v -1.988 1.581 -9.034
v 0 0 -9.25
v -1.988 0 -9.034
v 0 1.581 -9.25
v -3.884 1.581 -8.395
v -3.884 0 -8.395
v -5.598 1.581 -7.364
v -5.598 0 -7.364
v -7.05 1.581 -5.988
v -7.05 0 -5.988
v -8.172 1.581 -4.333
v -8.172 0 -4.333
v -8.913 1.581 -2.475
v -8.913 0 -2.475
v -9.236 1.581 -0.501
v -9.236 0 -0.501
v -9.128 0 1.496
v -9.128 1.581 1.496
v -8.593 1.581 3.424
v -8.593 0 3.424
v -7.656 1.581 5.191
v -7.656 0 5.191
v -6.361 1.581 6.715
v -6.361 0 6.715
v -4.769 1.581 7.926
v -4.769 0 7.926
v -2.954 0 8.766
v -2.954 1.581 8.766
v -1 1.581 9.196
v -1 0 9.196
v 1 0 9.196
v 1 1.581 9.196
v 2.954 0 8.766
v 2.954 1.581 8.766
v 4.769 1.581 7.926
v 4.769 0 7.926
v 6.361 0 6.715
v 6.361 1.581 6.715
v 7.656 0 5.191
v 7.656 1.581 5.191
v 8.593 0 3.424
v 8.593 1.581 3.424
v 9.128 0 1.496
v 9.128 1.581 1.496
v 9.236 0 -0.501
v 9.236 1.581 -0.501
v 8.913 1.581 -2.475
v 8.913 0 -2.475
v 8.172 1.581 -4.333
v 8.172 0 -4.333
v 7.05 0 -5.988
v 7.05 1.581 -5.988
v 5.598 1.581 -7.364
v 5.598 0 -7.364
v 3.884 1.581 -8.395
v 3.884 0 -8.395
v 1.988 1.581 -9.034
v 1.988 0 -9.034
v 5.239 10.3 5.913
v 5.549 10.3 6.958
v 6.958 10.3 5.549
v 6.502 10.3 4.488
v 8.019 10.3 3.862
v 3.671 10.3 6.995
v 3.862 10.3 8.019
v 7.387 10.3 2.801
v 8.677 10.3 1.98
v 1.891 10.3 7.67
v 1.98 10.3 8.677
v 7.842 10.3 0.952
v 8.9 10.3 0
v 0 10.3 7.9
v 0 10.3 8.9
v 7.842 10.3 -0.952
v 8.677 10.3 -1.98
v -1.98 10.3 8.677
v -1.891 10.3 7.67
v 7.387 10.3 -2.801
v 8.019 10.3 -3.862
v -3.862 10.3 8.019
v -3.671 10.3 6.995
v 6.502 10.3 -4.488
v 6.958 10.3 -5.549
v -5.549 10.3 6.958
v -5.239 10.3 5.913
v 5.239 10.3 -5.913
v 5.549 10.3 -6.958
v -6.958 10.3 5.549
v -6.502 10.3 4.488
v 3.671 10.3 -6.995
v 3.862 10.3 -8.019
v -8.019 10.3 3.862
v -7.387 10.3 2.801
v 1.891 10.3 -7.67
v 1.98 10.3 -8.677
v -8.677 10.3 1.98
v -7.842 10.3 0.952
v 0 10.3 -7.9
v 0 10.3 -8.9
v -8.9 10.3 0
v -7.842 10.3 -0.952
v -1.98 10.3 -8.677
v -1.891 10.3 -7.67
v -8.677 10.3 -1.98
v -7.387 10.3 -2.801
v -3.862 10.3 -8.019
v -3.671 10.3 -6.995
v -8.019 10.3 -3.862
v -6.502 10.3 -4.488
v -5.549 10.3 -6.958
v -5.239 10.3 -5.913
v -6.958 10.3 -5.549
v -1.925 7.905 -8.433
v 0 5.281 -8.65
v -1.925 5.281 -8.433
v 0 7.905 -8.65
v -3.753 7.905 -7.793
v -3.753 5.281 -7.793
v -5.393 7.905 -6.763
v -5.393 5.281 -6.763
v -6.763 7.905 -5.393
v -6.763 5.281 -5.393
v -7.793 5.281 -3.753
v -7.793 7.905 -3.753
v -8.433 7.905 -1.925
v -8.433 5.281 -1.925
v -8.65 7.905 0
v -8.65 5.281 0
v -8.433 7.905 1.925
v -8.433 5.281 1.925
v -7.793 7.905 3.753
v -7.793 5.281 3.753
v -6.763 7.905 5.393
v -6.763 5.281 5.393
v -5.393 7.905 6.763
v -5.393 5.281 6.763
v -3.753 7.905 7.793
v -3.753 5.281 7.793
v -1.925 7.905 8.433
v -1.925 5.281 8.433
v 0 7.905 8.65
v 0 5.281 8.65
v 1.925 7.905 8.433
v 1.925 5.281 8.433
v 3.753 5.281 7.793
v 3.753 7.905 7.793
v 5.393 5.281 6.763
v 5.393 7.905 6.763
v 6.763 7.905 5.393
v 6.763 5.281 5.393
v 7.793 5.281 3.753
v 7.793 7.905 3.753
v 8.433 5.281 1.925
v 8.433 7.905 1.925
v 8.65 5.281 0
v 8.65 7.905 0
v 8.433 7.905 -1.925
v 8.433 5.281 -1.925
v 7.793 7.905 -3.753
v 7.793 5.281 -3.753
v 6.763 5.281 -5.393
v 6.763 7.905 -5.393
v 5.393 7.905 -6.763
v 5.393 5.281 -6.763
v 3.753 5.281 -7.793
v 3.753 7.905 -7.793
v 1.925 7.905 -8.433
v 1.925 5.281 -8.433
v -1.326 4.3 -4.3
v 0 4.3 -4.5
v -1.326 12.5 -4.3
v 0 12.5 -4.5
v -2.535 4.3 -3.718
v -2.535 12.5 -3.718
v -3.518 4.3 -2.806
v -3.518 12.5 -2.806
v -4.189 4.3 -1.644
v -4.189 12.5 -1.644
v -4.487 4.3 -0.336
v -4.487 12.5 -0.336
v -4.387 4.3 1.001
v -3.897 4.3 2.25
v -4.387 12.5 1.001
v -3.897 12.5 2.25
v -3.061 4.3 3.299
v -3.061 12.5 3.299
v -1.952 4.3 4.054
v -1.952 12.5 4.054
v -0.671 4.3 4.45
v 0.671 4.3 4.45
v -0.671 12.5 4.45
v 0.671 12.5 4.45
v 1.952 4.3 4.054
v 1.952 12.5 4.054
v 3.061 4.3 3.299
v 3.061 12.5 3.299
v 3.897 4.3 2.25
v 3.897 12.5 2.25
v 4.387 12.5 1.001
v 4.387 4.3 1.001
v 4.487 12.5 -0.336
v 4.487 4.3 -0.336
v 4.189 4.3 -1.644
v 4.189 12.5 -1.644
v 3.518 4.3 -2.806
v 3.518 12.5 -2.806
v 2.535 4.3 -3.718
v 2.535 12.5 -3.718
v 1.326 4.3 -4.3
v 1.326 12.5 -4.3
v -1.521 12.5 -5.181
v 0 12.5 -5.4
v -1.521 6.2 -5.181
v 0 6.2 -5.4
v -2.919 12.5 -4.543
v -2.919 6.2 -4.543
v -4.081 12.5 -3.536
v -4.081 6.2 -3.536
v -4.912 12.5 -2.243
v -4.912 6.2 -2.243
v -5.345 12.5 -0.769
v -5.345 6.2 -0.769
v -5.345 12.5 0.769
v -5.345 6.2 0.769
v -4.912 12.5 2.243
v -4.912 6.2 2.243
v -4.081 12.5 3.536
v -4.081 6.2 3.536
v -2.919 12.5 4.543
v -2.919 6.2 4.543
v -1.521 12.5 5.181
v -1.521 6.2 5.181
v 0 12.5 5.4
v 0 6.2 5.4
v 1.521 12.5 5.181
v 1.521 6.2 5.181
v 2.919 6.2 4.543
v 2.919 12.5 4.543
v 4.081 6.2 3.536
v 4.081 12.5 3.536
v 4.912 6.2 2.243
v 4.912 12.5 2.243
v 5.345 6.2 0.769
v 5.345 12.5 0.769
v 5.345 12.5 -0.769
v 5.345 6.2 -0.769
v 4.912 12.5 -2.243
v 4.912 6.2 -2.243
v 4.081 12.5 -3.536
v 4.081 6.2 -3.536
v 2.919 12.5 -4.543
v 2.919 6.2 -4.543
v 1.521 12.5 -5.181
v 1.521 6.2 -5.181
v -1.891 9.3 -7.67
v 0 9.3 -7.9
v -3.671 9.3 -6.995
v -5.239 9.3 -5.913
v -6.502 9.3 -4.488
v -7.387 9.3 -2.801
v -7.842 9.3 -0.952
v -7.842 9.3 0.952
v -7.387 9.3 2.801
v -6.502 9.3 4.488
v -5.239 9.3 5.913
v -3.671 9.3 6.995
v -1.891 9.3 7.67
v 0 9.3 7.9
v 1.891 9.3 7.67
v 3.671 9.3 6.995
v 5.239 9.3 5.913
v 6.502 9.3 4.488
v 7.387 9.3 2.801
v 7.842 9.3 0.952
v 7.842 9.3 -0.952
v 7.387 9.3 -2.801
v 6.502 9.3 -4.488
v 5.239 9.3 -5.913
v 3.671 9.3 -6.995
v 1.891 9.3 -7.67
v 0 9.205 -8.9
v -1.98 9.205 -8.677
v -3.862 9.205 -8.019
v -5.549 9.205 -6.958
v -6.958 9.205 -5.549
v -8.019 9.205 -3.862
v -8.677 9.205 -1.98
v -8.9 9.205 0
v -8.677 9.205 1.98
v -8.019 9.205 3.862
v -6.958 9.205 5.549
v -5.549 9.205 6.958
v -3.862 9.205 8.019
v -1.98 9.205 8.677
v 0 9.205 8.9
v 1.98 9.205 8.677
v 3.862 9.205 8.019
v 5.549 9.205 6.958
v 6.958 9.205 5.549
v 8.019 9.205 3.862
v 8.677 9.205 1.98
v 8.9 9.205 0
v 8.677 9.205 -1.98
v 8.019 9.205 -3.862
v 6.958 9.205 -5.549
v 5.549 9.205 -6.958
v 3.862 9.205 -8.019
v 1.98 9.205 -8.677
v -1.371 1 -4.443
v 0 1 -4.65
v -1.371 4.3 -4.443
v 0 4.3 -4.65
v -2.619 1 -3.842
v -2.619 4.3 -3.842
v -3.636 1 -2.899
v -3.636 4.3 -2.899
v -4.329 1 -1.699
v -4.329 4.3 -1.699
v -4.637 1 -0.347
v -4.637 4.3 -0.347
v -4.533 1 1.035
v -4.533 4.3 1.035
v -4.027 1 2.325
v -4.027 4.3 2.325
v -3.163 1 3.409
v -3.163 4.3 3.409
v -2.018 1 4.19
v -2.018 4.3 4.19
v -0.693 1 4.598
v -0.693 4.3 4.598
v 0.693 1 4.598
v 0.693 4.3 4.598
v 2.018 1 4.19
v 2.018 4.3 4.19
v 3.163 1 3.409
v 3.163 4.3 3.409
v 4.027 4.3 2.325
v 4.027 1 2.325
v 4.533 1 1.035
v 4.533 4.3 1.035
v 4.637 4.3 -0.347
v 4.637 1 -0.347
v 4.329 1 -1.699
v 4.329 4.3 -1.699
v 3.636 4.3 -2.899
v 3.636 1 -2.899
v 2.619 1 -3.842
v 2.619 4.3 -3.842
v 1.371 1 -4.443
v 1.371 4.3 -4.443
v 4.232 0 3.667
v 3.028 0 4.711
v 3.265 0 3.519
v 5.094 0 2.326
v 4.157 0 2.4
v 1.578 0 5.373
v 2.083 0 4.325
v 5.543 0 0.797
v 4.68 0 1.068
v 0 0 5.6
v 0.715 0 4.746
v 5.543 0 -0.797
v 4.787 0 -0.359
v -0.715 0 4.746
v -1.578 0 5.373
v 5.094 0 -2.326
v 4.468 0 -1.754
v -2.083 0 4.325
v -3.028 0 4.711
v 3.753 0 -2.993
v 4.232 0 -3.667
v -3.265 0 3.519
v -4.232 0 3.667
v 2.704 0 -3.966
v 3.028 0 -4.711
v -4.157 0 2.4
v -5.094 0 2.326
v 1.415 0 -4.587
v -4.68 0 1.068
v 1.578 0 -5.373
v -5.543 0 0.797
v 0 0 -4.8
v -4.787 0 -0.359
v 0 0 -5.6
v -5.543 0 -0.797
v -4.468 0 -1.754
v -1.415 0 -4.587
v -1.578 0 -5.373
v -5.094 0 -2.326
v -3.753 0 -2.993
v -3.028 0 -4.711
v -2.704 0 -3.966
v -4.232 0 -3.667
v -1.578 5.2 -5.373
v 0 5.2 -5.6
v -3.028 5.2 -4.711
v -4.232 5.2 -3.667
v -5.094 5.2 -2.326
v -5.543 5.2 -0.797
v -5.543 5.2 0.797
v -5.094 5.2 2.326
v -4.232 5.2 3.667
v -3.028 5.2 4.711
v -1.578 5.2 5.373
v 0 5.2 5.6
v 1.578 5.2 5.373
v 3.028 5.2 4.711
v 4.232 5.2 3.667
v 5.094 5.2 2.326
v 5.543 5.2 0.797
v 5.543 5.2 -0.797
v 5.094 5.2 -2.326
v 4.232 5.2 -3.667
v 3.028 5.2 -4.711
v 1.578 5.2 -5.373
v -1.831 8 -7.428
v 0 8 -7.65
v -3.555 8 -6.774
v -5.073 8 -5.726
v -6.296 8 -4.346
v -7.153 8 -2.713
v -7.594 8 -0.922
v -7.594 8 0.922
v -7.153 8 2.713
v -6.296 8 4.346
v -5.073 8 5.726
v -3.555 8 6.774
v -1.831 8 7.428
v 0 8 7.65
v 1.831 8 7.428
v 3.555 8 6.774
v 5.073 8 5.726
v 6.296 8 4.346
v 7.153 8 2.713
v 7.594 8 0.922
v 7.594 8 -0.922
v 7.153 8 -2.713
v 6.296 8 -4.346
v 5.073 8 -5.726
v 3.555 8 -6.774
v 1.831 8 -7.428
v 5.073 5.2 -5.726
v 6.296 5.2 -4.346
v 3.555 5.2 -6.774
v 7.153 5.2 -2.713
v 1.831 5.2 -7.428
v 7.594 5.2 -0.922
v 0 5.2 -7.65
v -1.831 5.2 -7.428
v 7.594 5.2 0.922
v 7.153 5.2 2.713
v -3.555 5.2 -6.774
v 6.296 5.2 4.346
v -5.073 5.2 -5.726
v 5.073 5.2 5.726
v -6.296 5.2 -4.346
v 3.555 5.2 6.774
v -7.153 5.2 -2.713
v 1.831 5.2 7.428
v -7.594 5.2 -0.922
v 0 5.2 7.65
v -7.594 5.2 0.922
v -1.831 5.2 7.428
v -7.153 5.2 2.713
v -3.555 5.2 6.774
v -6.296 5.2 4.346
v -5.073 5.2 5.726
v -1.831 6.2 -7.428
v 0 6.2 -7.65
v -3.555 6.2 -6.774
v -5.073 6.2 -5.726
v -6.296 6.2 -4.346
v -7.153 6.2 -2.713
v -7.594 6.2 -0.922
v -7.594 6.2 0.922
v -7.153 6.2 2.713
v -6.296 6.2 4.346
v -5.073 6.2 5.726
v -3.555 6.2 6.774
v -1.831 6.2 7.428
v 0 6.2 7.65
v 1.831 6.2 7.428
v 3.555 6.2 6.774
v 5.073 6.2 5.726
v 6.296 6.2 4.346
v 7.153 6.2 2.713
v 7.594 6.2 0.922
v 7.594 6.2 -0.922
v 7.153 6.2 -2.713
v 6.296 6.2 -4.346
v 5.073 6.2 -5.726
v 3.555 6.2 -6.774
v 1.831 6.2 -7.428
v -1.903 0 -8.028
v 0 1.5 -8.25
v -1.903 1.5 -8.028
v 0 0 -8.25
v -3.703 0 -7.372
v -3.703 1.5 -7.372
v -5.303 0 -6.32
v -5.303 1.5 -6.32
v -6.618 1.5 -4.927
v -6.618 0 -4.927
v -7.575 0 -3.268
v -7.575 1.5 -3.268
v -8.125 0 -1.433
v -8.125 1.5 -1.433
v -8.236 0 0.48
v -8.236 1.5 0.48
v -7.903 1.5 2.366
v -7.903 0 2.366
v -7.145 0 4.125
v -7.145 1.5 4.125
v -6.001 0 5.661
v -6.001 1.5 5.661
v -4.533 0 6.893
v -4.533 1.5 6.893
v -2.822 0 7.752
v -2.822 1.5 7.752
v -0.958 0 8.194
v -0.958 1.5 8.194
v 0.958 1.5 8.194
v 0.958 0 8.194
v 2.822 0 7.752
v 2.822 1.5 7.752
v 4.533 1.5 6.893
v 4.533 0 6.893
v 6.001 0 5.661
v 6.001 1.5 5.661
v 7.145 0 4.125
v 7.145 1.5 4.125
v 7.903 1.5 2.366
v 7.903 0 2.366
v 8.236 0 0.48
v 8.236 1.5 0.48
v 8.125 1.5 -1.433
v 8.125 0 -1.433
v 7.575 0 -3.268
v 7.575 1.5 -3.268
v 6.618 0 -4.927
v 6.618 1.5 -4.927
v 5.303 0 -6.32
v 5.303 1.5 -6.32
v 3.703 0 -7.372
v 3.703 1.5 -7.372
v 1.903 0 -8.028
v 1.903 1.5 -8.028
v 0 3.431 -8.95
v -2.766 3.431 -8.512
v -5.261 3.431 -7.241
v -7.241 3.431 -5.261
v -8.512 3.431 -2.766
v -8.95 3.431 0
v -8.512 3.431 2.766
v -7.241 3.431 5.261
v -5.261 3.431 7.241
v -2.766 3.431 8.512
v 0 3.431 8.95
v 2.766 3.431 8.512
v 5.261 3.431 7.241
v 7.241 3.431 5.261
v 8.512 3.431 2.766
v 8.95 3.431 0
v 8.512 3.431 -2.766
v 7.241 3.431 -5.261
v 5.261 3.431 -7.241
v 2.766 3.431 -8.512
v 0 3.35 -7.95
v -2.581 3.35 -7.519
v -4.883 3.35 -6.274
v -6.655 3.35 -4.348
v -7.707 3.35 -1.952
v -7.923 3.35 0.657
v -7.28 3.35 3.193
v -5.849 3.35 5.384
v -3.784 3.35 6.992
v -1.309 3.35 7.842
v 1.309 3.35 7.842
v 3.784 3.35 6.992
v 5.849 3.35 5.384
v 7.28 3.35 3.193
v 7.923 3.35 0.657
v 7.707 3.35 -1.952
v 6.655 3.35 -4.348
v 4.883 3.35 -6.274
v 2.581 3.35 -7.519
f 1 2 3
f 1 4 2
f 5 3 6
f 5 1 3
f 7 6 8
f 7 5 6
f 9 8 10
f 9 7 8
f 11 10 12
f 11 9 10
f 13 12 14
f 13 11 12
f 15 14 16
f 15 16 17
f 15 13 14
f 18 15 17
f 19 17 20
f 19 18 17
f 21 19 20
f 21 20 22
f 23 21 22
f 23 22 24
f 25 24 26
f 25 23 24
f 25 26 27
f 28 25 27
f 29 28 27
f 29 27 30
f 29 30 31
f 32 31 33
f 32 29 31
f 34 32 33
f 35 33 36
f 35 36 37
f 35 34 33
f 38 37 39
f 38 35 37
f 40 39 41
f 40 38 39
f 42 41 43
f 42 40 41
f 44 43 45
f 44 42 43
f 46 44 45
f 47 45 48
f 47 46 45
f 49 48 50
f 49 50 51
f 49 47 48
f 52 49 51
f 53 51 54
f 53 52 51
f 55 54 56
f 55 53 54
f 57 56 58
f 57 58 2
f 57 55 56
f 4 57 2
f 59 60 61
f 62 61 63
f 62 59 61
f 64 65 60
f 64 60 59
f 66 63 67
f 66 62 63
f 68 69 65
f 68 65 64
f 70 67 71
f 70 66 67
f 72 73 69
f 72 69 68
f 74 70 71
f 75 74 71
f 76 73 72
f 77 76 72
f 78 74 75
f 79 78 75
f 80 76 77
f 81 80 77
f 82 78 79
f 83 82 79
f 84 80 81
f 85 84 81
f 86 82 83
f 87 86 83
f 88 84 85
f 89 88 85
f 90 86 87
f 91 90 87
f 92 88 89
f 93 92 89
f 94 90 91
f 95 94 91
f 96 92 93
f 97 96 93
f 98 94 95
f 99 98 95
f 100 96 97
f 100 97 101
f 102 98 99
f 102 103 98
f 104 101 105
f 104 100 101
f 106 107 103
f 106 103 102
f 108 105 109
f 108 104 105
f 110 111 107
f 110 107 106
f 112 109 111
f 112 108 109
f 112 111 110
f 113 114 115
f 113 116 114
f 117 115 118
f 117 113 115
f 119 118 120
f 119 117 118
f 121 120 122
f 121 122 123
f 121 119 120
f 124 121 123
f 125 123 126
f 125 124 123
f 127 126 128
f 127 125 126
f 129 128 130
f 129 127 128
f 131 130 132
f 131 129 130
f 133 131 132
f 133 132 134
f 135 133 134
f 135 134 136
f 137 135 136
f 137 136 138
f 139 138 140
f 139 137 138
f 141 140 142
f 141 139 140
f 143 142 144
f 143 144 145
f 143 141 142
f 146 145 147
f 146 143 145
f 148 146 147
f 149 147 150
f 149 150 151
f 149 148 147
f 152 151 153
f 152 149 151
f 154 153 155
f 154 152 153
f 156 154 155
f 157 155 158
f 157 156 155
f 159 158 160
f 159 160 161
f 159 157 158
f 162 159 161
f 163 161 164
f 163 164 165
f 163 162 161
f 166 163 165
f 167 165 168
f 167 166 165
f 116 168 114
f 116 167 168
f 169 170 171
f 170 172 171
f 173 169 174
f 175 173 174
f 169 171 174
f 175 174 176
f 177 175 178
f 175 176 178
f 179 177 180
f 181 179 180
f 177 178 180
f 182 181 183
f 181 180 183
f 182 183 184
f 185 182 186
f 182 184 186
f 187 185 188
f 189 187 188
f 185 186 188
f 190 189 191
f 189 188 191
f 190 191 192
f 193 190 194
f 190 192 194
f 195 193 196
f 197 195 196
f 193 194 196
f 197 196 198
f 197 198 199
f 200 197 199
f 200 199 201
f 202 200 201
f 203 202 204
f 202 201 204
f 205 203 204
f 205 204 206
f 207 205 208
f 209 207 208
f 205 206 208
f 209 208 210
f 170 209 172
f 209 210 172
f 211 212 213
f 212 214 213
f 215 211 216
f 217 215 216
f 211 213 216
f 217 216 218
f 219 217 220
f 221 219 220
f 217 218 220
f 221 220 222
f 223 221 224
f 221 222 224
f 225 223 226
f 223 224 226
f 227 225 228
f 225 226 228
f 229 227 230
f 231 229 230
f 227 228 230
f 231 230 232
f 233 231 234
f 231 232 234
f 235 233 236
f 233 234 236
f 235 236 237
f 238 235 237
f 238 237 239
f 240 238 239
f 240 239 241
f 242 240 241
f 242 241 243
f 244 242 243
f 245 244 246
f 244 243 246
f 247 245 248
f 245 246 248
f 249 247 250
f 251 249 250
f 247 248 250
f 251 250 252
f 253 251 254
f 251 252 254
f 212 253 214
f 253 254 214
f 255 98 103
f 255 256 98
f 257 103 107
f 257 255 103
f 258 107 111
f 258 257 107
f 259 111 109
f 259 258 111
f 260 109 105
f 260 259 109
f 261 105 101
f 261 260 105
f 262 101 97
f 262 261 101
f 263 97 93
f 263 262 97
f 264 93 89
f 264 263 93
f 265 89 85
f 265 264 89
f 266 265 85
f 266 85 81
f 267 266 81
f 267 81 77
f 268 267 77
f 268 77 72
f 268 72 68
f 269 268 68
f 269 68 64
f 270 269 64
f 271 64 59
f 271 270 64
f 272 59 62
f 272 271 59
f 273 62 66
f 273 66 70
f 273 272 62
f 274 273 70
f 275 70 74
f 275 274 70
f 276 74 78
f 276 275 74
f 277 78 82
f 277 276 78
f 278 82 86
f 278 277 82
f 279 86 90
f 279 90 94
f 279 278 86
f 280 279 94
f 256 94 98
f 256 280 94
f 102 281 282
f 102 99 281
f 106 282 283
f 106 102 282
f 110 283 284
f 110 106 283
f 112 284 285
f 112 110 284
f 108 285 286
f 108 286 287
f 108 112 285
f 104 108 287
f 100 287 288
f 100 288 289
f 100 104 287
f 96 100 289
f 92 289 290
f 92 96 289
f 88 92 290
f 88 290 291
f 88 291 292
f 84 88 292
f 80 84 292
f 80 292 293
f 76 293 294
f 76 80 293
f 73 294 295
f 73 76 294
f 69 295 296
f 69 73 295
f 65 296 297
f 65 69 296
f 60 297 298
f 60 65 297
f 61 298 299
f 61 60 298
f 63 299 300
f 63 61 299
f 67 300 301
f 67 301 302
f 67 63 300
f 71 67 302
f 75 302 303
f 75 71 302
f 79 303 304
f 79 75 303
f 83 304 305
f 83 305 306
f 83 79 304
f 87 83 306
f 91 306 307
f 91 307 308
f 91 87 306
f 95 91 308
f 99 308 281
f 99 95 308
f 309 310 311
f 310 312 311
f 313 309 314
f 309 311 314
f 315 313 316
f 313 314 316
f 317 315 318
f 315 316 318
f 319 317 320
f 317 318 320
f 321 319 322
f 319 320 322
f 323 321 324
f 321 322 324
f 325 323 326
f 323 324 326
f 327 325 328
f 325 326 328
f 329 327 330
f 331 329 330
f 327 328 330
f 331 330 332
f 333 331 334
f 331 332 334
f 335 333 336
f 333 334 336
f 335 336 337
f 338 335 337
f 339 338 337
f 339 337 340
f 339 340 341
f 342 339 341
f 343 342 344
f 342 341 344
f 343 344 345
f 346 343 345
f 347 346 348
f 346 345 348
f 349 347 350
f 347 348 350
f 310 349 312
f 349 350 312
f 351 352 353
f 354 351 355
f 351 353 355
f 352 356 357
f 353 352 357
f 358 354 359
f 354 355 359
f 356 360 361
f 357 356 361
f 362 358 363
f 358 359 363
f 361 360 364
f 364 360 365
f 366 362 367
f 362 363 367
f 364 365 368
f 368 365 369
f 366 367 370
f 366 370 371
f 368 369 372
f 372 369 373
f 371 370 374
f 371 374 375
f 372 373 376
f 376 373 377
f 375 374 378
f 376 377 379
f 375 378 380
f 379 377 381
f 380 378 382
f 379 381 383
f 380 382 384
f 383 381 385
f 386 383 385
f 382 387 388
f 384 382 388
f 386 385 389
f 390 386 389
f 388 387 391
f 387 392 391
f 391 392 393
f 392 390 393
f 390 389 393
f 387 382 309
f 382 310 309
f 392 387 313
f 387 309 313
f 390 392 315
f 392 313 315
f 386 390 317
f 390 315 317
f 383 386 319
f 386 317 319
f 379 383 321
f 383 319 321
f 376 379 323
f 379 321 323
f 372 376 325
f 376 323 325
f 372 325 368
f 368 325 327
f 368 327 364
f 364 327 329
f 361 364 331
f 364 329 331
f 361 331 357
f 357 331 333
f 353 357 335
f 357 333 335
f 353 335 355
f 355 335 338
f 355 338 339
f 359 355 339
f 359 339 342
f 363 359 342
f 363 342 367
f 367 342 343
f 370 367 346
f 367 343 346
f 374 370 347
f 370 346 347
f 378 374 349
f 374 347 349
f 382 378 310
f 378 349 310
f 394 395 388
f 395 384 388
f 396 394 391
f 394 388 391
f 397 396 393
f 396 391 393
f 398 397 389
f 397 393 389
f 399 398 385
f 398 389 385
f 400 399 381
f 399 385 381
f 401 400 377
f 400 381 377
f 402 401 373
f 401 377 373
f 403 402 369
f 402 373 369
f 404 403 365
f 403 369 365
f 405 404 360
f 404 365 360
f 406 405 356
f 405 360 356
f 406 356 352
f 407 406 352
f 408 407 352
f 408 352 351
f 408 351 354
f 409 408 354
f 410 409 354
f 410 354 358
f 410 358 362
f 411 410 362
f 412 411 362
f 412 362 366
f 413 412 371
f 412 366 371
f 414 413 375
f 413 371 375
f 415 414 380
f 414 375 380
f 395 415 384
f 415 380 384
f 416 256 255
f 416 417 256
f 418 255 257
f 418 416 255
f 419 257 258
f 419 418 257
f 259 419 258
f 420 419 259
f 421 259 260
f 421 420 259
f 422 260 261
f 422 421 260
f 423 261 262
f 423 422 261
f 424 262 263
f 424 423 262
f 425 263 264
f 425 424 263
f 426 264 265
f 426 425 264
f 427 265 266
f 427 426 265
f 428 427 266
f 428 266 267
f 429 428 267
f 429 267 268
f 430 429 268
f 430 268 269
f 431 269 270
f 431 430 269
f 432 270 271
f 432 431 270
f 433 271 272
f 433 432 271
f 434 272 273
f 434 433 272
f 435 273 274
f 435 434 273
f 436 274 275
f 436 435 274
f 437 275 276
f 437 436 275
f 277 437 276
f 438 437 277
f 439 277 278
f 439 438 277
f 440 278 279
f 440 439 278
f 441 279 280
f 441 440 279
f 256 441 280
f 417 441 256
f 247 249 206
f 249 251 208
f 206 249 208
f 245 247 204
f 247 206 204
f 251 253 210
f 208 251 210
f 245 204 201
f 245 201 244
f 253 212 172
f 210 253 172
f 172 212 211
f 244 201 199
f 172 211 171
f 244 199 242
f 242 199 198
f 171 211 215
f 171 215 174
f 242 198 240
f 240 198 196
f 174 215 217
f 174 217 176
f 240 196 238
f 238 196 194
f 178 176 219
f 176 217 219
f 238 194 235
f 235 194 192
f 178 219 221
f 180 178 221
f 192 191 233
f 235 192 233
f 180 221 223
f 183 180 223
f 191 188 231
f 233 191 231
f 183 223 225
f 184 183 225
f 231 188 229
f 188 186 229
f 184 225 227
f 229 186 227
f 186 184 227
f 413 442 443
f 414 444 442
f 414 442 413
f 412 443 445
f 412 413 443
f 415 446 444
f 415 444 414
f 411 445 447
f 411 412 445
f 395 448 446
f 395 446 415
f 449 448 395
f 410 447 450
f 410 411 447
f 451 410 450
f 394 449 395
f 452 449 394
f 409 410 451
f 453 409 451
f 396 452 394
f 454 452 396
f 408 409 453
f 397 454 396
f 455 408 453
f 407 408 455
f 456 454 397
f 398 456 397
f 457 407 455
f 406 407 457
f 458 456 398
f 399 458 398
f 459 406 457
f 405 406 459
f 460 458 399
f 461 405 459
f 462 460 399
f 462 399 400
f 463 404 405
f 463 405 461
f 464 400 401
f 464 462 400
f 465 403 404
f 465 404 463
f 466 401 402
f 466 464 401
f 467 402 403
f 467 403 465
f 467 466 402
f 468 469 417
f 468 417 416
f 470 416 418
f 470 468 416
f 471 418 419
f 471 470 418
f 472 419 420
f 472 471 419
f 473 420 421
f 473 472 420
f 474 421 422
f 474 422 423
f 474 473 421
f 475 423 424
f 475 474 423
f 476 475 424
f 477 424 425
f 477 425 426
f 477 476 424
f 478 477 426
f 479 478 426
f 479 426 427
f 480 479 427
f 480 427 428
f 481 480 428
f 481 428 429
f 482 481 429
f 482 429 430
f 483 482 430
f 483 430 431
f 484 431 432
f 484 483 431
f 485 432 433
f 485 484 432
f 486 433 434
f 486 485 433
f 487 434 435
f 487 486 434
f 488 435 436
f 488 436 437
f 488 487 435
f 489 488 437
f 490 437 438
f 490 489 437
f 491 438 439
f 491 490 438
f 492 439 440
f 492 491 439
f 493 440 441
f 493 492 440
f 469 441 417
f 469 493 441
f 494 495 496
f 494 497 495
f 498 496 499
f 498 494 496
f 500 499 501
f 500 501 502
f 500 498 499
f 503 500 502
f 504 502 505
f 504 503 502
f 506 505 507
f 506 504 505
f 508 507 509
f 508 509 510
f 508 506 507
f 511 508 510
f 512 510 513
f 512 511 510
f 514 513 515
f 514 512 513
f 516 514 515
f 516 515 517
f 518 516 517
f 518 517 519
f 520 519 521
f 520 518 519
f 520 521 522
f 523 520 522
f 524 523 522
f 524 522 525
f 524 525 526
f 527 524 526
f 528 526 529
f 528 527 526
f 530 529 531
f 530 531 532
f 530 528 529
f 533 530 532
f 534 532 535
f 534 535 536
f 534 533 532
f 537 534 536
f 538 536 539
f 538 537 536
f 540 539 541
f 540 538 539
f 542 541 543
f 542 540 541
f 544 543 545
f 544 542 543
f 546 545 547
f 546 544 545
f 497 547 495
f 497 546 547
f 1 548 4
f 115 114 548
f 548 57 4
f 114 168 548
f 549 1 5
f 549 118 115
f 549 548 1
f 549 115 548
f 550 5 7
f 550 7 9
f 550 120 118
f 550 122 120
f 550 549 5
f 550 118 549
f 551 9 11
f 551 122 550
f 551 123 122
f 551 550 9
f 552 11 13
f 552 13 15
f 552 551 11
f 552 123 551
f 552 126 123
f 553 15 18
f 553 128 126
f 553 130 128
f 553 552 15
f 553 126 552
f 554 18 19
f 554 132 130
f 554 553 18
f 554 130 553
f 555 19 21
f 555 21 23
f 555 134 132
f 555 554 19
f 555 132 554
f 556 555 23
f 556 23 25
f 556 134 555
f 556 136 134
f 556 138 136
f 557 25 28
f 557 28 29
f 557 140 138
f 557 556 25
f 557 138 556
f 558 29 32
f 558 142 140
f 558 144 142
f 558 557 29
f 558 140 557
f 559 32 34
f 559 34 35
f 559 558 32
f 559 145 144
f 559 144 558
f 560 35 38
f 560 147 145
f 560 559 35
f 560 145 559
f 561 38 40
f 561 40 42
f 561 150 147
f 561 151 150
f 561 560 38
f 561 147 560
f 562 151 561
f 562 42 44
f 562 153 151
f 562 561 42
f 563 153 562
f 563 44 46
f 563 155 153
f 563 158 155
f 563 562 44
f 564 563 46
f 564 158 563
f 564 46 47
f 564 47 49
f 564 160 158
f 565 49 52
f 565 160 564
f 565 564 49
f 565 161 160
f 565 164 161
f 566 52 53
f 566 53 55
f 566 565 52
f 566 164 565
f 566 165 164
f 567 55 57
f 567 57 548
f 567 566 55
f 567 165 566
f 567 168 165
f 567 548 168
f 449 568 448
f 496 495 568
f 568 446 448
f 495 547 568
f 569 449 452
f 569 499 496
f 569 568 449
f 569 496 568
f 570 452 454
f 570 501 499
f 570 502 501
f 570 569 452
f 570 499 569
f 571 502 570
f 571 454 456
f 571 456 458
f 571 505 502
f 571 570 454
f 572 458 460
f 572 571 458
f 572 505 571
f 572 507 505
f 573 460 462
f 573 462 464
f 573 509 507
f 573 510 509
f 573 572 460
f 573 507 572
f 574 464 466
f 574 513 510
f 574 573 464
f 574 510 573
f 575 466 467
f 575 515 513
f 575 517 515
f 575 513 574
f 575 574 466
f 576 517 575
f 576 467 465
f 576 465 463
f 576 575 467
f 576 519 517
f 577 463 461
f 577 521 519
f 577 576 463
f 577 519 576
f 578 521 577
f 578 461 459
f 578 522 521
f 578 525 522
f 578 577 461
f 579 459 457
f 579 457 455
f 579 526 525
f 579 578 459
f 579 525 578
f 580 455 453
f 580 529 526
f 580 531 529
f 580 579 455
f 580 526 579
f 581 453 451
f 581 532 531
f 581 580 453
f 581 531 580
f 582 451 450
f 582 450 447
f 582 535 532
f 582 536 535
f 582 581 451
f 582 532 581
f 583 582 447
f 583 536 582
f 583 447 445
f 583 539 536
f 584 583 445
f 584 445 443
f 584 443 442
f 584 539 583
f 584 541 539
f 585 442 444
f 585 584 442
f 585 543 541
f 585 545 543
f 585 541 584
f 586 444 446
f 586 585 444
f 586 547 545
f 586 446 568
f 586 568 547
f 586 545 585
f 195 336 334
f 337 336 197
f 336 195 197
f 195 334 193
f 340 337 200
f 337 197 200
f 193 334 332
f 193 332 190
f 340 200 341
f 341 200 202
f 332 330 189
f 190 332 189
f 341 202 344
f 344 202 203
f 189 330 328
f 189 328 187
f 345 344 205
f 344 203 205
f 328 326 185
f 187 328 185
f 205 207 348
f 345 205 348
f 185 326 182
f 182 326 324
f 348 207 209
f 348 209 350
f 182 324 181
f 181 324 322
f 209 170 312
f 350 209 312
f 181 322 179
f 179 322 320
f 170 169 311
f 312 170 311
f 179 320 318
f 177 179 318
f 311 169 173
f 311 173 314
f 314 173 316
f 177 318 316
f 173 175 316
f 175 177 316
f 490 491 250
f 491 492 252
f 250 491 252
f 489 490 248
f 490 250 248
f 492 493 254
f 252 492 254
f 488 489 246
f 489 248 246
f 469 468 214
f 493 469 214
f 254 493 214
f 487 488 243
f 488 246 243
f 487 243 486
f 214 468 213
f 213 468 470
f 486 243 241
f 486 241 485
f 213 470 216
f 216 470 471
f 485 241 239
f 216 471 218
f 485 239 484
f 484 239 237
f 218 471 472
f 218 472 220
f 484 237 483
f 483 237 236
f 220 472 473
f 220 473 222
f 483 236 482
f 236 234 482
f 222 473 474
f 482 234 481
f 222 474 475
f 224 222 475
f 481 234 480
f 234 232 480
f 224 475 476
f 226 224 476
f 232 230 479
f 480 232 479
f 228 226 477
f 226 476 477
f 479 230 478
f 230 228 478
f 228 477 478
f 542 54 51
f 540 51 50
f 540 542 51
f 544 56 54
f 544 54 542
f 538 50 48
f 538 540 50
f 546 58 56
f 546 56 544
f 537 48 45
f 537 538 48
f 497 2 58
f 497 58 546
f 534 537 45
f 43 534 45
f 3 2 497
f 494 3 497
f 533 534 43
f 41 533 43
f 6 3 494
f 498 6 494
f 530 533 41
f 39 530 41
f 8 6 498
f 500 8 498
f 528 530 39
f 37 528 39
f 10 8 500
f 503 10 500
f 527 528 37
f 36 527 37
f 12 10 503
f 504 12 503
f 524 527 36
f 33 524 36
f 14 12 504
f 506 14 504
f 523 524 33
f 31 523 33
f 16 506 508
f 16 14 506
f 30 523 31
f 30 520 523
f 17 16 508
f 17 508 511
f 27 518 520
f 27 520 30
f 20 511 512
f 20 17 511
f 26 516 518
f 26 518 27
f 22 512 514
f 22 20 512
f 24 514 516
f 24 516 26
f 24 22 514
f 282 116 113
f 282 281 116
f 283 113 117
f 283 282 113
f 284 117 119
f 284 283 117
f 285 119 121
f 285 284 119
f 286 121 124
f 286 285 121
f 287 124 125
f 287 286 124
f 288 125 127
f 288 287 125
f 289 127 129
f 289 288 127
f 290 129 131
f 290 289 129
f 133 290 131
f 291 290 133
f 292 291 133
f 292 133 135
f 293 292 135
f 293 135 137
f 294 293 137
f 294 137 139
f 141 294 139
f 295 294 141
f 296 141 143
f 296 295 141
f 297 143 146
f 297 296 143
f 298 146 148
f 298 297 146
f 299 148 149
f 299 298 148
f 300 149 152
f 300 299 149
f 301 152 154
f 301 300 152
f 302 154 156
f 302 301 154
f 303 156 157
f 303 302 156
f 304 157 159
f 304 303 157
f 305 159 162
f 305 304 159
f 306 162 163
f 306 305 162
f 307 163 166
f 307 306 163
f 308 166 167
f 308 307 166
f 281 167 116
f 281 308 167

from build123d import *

# Parameters (mm, degrees)
SKETCH2_W = 2.05
SKETCH2_H = 1


with BuildPart() as part:
    # Sketch1 → Revolve1 (revolve)
    with BuildSketch(Plane(origin=(0, 0, 0), x_dir=(0, 0, -1), z_dir=(1, 0, 0))):
        Polygon((4.65, 1), (4.65, 4.3), (4.5, 4.3), (4.5, 12.5), (5.4, 12.5), (5.4, 6.2), (5.6, 6.2), (5.6, 0), (4.8, 0), align=None)
    revolve(axis=Axis((0, 0, 0), (0, 1, 0)))

    # Sketch2 → Revolve2 (revolve)
    with BuildSketch(Plane(origin=(0, 0, 0), x_dir=(0, 0, -1), z_dir=(1, 0, 0))):
        with Locations((6.625, 5.7)):
            Rectangle(SKETCH2_W, SKETCH2_H)
    revolve(axis=Axis((0, 0, 0), (0, 1, 0)))

    # Sketch3 → Revolve-Thin1 (revolve)
    with BuildSketch(Plane(origin=(0, 0, 0), x_dir=(0, 0, -1), z_dir=(1, 0, 0))):
        Polygon((7.9, 10.3), (7.9, 9.3), (7.65, 8), (7.65, 5.2), (8.25, 1.5), (8.25, 0), (9.25, 0), (9.25, 1.580554938), (8.65, 5.280554938), (8.65, 7.904719082), (8.9, 9.204719082), (8.9, 10.3), align=None)
    revolve(axis=Axis((0, 0, 0), (0, 1, 0)))


solid = part.part
